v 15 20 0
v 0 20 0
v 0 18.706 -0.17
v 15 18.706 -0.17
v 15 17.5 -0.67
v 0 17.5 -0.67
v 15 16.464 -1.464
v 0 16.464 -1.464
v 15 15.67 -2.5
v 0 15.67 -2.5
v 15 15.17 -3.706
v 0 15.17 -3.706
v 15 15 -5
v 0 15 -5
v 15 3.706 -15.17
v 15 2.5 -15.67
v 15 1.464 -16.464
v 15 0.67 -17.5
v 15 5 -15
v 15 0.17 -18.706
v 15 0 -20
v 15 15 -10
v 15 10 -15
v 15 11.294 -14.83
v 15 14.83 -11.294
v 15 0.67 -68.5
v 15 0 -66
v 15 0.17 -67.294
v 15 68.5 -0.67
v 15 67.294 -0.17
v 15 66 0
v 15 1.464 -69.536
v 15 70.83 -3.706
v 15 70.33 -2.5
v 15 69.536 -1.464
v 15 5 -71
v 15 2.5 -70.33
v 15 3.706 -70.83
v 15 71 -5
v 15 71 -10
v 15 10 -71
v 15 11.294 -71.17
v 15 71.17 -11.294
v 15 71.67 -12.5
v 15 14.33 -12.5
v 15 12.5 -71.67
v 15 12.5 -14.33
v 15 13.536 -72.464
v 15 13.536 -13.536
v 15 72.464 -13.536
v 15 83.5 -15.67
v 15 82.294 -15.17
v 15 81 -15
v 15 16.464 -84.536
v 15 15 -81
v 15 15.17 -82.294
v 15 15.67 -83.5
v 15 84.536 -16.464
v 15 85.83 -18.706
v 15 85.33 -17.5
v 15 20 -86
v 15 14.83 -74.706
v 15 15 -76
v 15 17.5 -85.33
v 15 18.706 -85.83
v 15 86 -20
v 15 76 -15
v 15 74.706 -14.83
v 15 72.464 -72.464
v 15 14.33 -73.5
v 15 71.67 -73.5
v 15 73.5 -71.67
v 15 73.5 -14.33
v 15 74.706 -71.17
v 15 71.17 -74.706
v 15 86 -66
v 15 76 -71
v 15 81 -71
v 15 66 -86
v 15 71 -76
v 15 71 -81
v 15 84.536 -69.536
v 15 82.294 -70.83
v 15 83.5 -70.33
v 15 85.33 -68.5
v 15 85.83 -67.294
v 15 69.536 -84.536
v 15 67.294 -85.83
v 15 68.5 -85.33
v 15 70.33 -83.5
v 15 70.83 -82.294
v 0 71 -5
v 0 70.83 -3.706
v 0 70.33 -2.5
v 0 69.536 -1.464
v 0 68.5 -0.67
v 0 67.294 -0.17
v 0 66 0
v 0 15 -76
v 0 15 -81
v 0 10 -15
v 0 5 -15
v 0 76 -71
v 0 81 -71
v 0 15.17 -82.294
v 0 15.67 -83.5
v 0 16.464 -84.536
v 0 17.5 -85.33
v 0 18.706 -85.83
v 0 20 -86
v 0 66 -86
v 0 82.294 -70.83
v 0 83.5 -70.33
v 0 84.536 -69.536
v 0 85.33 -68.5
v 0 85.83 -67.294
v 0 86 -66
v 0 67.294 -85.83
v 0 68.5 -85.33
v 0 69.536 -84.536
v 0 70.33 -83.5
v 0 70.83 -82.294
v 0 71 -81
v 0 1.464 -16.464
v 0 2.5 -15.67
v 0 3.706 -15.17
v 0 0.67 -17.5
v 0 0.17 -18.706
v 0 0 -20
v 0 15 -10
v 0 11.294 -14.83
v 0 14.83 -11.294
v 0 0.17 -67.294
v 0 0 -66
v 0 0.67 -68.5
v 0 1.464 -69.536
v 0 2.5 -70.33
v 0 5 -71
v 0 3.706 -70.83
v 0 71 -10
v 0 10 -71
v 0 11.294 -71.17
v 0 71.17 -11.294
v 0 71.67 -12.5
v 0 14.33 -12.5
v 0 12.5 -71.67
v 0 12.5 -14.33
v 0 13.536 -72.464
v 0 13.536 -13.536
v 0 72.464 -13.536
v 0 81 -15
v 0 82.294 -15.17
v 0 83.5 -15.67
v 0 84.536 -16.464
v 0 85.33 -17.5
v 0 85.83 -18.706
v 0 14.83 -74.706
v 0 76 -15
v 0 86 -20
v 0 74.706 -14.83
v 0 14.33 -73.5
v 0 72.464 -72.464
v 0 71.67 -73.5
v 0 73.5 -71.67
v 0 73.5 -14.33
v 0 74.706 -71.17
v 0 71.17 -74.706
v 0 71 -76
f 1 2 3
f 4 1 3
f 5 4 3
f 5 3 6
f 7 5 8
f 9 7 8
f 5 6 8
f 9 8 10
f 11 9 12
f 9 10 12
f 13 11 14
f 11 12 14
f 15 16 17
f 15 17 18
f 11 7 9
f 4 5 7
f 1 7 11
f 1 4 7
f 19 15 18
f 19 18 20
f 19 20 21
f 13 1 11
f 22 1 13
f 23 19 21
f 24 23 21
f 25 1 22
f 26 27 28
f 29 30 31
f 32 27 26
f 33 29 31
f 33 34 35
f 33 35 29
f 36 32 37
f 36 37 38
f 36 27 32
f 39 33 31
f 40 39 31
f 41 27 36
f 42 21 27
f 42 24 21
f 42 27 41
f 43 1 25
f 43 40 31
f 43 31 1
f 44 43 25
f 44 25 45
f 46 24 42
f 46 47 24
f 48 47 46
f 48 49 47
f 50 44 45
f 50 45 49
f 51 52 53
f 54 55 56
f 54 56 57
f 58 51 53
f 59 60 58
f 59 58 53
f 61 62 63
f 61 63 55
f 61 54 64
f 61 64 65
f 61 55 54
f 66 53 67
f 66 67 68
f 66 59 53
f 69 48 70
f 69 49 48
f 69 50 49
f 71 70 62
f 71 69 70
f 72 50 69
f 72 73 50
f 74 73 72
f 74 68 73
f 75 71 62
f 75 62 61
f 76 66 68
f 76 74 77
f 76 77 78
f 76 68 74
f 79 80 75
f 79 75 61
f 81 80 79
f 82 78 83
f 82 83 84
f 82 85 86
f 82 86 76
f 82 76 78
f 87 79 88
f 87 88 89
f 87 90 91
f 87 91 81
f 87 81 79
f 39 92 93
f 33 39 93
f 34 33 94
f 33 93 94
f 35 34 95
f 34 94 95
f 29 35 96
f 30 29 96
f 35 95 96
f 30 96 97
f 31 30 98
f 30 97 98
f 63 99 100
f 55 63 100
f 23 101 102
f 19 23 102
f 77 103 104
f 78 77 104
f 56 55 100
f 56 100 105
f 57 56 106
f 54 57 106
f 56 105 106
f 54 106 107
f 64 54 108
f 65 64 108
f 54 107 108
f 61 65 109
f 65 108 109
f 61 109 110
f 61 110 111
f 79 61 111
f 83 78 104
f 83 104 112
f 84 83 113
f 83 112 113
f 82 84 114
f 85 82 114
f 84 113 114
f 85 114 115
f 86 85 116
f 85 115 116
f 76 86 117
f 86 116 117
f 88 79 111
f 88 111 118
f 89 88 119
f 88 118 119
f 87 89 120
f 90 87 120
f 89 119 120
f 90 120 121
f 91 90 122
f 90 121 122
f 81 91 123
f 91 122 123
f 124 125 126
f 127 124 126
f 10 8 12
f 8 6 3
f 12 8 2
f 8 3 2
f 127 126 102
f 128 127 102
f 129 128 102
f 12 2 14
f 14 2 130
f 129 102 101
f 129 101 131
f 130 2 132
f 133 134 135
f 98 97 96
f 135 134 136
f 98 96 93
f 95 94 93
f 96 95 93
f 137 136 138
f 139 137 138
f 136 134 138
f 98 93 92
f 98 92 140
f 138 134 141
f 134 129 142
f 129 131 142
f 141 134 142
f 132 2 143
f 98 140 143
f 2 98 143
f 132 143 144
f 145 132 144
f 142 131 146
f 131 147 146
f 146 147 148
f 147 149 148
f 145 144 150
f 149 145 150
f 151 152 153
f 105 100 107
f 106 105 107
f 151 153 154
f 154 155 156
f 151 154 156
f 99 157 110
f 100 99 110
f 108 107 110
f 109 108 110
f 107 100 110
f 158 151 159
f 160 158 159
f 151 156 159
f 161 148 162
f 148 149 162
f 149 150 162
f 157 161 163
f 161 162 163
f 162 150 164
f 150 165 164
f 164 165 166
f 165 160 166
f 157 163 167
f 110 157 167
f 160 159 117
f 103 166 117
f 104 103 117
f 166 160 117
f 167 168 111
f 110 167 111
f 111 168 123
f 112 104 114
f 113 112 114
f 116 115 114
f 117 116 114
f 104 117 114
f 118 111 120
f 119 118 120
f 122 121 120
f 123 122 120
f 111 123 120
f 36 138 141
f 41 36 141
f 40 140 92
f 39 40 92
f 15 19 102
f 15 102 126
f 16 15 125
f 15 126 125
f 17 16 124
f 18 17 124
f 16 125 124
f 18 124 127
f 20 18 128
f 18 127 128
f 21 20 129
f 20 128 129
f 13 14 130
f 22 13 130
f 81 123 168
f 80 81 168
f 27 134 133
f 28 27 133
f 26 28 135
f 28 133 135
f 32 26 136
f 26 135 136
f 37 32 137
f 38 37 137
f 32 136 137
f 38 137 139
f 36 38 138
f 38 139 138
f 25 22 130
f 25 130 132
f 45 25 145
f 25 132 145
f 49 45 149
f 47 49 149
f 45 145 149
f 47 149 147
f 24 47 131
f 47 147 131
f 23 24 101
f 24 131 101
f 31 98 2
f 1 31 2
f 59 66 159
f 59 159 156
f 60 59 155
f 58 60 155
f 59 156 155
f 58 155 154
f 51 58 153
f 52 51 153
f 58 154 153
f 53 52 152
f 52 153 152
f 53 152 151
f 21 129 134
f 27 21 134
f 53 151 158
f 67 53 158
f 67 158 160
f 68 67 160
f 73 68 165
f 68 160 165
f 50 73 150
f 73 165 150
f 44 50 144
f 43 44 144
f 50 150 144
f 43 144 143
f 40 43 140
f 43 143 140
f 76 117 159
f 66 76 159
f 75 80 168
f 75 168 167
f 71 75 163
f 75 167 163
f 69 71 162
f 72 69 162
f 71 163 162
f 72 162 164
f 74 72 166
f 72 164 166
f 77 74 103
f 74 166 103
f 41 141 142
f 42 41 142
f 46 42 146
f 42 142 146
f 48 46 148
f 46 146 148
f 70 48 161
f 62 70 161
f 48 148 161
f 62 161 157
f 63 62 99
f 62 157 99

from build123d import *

# Parameters (mm, degrees)
BOSS_EXTRUDE1_DEPTH = 15


with BuildPart() as part:
    # Sketch1 → Boss-Extrude1 (new body)
    with BuildSketch(Plane(origin=(0, 0, 0), x_dir=(0, 0, -1), z_dir=(1, 0, 0))):
        with BuildLine():
            Line((20, 0), (66, 0))
            ThreePointArc((66, 0), (69.535533906, 1.464466094), (71, 5))
            Line((71, 5), (71, 10))
            ThreePointArc((71, 10), (72.464466094, 13.535533906), (76, 15))
            Line((76, 15), (81, 15))
            ThreePointArc((81, 15), (84.535533906, 16.464466094), (86, 20))
            Line((86, 20), (86, 66))
            ThreePointArc((86, 66), (84.535533906, 69.535533906), (81, 71))
            Line((81, 71), (76, 71))
            ThreePointArc((76, 71), (72.464466094, 72.464466094), (71, 76))
            Line((71, 76), (71, 81))
            ThreePointArc((71, 81), (69.535533906, 84.535533906), (66, 86))
            Line((66, 86), (20, 86))
            ThreePointArc((20, 86), (16.464466094, 84.535533906), (15, 81))
            Line((15, 81), (15, 76))
            ThreePointArc((15, 76), (13.535533906, 72.464466094), (10, 71))
            Line((10, 71), (5, 71))
            ThreePointArc((5, 71), (1.464466094, 69.535533906), (0, 66))
            Line((0, 66), (0, 20))
            ThreePointArc((0, 20), (1.464466094, 16.464466094), (5, 15))
            Line((5, 15), (10, 15))
            ThreePointArc((10, 15), (13.535533906, 13.535533906), (15, 10))
            Line((15, 10), (15, 5))
            ThreePointArc((15, 5), (16.464466094, 1.464466094), (20, 0))
        make_face()
    extrude(amount=BOSS_EXTRUDE1_DEPTH)


solid = part.part
